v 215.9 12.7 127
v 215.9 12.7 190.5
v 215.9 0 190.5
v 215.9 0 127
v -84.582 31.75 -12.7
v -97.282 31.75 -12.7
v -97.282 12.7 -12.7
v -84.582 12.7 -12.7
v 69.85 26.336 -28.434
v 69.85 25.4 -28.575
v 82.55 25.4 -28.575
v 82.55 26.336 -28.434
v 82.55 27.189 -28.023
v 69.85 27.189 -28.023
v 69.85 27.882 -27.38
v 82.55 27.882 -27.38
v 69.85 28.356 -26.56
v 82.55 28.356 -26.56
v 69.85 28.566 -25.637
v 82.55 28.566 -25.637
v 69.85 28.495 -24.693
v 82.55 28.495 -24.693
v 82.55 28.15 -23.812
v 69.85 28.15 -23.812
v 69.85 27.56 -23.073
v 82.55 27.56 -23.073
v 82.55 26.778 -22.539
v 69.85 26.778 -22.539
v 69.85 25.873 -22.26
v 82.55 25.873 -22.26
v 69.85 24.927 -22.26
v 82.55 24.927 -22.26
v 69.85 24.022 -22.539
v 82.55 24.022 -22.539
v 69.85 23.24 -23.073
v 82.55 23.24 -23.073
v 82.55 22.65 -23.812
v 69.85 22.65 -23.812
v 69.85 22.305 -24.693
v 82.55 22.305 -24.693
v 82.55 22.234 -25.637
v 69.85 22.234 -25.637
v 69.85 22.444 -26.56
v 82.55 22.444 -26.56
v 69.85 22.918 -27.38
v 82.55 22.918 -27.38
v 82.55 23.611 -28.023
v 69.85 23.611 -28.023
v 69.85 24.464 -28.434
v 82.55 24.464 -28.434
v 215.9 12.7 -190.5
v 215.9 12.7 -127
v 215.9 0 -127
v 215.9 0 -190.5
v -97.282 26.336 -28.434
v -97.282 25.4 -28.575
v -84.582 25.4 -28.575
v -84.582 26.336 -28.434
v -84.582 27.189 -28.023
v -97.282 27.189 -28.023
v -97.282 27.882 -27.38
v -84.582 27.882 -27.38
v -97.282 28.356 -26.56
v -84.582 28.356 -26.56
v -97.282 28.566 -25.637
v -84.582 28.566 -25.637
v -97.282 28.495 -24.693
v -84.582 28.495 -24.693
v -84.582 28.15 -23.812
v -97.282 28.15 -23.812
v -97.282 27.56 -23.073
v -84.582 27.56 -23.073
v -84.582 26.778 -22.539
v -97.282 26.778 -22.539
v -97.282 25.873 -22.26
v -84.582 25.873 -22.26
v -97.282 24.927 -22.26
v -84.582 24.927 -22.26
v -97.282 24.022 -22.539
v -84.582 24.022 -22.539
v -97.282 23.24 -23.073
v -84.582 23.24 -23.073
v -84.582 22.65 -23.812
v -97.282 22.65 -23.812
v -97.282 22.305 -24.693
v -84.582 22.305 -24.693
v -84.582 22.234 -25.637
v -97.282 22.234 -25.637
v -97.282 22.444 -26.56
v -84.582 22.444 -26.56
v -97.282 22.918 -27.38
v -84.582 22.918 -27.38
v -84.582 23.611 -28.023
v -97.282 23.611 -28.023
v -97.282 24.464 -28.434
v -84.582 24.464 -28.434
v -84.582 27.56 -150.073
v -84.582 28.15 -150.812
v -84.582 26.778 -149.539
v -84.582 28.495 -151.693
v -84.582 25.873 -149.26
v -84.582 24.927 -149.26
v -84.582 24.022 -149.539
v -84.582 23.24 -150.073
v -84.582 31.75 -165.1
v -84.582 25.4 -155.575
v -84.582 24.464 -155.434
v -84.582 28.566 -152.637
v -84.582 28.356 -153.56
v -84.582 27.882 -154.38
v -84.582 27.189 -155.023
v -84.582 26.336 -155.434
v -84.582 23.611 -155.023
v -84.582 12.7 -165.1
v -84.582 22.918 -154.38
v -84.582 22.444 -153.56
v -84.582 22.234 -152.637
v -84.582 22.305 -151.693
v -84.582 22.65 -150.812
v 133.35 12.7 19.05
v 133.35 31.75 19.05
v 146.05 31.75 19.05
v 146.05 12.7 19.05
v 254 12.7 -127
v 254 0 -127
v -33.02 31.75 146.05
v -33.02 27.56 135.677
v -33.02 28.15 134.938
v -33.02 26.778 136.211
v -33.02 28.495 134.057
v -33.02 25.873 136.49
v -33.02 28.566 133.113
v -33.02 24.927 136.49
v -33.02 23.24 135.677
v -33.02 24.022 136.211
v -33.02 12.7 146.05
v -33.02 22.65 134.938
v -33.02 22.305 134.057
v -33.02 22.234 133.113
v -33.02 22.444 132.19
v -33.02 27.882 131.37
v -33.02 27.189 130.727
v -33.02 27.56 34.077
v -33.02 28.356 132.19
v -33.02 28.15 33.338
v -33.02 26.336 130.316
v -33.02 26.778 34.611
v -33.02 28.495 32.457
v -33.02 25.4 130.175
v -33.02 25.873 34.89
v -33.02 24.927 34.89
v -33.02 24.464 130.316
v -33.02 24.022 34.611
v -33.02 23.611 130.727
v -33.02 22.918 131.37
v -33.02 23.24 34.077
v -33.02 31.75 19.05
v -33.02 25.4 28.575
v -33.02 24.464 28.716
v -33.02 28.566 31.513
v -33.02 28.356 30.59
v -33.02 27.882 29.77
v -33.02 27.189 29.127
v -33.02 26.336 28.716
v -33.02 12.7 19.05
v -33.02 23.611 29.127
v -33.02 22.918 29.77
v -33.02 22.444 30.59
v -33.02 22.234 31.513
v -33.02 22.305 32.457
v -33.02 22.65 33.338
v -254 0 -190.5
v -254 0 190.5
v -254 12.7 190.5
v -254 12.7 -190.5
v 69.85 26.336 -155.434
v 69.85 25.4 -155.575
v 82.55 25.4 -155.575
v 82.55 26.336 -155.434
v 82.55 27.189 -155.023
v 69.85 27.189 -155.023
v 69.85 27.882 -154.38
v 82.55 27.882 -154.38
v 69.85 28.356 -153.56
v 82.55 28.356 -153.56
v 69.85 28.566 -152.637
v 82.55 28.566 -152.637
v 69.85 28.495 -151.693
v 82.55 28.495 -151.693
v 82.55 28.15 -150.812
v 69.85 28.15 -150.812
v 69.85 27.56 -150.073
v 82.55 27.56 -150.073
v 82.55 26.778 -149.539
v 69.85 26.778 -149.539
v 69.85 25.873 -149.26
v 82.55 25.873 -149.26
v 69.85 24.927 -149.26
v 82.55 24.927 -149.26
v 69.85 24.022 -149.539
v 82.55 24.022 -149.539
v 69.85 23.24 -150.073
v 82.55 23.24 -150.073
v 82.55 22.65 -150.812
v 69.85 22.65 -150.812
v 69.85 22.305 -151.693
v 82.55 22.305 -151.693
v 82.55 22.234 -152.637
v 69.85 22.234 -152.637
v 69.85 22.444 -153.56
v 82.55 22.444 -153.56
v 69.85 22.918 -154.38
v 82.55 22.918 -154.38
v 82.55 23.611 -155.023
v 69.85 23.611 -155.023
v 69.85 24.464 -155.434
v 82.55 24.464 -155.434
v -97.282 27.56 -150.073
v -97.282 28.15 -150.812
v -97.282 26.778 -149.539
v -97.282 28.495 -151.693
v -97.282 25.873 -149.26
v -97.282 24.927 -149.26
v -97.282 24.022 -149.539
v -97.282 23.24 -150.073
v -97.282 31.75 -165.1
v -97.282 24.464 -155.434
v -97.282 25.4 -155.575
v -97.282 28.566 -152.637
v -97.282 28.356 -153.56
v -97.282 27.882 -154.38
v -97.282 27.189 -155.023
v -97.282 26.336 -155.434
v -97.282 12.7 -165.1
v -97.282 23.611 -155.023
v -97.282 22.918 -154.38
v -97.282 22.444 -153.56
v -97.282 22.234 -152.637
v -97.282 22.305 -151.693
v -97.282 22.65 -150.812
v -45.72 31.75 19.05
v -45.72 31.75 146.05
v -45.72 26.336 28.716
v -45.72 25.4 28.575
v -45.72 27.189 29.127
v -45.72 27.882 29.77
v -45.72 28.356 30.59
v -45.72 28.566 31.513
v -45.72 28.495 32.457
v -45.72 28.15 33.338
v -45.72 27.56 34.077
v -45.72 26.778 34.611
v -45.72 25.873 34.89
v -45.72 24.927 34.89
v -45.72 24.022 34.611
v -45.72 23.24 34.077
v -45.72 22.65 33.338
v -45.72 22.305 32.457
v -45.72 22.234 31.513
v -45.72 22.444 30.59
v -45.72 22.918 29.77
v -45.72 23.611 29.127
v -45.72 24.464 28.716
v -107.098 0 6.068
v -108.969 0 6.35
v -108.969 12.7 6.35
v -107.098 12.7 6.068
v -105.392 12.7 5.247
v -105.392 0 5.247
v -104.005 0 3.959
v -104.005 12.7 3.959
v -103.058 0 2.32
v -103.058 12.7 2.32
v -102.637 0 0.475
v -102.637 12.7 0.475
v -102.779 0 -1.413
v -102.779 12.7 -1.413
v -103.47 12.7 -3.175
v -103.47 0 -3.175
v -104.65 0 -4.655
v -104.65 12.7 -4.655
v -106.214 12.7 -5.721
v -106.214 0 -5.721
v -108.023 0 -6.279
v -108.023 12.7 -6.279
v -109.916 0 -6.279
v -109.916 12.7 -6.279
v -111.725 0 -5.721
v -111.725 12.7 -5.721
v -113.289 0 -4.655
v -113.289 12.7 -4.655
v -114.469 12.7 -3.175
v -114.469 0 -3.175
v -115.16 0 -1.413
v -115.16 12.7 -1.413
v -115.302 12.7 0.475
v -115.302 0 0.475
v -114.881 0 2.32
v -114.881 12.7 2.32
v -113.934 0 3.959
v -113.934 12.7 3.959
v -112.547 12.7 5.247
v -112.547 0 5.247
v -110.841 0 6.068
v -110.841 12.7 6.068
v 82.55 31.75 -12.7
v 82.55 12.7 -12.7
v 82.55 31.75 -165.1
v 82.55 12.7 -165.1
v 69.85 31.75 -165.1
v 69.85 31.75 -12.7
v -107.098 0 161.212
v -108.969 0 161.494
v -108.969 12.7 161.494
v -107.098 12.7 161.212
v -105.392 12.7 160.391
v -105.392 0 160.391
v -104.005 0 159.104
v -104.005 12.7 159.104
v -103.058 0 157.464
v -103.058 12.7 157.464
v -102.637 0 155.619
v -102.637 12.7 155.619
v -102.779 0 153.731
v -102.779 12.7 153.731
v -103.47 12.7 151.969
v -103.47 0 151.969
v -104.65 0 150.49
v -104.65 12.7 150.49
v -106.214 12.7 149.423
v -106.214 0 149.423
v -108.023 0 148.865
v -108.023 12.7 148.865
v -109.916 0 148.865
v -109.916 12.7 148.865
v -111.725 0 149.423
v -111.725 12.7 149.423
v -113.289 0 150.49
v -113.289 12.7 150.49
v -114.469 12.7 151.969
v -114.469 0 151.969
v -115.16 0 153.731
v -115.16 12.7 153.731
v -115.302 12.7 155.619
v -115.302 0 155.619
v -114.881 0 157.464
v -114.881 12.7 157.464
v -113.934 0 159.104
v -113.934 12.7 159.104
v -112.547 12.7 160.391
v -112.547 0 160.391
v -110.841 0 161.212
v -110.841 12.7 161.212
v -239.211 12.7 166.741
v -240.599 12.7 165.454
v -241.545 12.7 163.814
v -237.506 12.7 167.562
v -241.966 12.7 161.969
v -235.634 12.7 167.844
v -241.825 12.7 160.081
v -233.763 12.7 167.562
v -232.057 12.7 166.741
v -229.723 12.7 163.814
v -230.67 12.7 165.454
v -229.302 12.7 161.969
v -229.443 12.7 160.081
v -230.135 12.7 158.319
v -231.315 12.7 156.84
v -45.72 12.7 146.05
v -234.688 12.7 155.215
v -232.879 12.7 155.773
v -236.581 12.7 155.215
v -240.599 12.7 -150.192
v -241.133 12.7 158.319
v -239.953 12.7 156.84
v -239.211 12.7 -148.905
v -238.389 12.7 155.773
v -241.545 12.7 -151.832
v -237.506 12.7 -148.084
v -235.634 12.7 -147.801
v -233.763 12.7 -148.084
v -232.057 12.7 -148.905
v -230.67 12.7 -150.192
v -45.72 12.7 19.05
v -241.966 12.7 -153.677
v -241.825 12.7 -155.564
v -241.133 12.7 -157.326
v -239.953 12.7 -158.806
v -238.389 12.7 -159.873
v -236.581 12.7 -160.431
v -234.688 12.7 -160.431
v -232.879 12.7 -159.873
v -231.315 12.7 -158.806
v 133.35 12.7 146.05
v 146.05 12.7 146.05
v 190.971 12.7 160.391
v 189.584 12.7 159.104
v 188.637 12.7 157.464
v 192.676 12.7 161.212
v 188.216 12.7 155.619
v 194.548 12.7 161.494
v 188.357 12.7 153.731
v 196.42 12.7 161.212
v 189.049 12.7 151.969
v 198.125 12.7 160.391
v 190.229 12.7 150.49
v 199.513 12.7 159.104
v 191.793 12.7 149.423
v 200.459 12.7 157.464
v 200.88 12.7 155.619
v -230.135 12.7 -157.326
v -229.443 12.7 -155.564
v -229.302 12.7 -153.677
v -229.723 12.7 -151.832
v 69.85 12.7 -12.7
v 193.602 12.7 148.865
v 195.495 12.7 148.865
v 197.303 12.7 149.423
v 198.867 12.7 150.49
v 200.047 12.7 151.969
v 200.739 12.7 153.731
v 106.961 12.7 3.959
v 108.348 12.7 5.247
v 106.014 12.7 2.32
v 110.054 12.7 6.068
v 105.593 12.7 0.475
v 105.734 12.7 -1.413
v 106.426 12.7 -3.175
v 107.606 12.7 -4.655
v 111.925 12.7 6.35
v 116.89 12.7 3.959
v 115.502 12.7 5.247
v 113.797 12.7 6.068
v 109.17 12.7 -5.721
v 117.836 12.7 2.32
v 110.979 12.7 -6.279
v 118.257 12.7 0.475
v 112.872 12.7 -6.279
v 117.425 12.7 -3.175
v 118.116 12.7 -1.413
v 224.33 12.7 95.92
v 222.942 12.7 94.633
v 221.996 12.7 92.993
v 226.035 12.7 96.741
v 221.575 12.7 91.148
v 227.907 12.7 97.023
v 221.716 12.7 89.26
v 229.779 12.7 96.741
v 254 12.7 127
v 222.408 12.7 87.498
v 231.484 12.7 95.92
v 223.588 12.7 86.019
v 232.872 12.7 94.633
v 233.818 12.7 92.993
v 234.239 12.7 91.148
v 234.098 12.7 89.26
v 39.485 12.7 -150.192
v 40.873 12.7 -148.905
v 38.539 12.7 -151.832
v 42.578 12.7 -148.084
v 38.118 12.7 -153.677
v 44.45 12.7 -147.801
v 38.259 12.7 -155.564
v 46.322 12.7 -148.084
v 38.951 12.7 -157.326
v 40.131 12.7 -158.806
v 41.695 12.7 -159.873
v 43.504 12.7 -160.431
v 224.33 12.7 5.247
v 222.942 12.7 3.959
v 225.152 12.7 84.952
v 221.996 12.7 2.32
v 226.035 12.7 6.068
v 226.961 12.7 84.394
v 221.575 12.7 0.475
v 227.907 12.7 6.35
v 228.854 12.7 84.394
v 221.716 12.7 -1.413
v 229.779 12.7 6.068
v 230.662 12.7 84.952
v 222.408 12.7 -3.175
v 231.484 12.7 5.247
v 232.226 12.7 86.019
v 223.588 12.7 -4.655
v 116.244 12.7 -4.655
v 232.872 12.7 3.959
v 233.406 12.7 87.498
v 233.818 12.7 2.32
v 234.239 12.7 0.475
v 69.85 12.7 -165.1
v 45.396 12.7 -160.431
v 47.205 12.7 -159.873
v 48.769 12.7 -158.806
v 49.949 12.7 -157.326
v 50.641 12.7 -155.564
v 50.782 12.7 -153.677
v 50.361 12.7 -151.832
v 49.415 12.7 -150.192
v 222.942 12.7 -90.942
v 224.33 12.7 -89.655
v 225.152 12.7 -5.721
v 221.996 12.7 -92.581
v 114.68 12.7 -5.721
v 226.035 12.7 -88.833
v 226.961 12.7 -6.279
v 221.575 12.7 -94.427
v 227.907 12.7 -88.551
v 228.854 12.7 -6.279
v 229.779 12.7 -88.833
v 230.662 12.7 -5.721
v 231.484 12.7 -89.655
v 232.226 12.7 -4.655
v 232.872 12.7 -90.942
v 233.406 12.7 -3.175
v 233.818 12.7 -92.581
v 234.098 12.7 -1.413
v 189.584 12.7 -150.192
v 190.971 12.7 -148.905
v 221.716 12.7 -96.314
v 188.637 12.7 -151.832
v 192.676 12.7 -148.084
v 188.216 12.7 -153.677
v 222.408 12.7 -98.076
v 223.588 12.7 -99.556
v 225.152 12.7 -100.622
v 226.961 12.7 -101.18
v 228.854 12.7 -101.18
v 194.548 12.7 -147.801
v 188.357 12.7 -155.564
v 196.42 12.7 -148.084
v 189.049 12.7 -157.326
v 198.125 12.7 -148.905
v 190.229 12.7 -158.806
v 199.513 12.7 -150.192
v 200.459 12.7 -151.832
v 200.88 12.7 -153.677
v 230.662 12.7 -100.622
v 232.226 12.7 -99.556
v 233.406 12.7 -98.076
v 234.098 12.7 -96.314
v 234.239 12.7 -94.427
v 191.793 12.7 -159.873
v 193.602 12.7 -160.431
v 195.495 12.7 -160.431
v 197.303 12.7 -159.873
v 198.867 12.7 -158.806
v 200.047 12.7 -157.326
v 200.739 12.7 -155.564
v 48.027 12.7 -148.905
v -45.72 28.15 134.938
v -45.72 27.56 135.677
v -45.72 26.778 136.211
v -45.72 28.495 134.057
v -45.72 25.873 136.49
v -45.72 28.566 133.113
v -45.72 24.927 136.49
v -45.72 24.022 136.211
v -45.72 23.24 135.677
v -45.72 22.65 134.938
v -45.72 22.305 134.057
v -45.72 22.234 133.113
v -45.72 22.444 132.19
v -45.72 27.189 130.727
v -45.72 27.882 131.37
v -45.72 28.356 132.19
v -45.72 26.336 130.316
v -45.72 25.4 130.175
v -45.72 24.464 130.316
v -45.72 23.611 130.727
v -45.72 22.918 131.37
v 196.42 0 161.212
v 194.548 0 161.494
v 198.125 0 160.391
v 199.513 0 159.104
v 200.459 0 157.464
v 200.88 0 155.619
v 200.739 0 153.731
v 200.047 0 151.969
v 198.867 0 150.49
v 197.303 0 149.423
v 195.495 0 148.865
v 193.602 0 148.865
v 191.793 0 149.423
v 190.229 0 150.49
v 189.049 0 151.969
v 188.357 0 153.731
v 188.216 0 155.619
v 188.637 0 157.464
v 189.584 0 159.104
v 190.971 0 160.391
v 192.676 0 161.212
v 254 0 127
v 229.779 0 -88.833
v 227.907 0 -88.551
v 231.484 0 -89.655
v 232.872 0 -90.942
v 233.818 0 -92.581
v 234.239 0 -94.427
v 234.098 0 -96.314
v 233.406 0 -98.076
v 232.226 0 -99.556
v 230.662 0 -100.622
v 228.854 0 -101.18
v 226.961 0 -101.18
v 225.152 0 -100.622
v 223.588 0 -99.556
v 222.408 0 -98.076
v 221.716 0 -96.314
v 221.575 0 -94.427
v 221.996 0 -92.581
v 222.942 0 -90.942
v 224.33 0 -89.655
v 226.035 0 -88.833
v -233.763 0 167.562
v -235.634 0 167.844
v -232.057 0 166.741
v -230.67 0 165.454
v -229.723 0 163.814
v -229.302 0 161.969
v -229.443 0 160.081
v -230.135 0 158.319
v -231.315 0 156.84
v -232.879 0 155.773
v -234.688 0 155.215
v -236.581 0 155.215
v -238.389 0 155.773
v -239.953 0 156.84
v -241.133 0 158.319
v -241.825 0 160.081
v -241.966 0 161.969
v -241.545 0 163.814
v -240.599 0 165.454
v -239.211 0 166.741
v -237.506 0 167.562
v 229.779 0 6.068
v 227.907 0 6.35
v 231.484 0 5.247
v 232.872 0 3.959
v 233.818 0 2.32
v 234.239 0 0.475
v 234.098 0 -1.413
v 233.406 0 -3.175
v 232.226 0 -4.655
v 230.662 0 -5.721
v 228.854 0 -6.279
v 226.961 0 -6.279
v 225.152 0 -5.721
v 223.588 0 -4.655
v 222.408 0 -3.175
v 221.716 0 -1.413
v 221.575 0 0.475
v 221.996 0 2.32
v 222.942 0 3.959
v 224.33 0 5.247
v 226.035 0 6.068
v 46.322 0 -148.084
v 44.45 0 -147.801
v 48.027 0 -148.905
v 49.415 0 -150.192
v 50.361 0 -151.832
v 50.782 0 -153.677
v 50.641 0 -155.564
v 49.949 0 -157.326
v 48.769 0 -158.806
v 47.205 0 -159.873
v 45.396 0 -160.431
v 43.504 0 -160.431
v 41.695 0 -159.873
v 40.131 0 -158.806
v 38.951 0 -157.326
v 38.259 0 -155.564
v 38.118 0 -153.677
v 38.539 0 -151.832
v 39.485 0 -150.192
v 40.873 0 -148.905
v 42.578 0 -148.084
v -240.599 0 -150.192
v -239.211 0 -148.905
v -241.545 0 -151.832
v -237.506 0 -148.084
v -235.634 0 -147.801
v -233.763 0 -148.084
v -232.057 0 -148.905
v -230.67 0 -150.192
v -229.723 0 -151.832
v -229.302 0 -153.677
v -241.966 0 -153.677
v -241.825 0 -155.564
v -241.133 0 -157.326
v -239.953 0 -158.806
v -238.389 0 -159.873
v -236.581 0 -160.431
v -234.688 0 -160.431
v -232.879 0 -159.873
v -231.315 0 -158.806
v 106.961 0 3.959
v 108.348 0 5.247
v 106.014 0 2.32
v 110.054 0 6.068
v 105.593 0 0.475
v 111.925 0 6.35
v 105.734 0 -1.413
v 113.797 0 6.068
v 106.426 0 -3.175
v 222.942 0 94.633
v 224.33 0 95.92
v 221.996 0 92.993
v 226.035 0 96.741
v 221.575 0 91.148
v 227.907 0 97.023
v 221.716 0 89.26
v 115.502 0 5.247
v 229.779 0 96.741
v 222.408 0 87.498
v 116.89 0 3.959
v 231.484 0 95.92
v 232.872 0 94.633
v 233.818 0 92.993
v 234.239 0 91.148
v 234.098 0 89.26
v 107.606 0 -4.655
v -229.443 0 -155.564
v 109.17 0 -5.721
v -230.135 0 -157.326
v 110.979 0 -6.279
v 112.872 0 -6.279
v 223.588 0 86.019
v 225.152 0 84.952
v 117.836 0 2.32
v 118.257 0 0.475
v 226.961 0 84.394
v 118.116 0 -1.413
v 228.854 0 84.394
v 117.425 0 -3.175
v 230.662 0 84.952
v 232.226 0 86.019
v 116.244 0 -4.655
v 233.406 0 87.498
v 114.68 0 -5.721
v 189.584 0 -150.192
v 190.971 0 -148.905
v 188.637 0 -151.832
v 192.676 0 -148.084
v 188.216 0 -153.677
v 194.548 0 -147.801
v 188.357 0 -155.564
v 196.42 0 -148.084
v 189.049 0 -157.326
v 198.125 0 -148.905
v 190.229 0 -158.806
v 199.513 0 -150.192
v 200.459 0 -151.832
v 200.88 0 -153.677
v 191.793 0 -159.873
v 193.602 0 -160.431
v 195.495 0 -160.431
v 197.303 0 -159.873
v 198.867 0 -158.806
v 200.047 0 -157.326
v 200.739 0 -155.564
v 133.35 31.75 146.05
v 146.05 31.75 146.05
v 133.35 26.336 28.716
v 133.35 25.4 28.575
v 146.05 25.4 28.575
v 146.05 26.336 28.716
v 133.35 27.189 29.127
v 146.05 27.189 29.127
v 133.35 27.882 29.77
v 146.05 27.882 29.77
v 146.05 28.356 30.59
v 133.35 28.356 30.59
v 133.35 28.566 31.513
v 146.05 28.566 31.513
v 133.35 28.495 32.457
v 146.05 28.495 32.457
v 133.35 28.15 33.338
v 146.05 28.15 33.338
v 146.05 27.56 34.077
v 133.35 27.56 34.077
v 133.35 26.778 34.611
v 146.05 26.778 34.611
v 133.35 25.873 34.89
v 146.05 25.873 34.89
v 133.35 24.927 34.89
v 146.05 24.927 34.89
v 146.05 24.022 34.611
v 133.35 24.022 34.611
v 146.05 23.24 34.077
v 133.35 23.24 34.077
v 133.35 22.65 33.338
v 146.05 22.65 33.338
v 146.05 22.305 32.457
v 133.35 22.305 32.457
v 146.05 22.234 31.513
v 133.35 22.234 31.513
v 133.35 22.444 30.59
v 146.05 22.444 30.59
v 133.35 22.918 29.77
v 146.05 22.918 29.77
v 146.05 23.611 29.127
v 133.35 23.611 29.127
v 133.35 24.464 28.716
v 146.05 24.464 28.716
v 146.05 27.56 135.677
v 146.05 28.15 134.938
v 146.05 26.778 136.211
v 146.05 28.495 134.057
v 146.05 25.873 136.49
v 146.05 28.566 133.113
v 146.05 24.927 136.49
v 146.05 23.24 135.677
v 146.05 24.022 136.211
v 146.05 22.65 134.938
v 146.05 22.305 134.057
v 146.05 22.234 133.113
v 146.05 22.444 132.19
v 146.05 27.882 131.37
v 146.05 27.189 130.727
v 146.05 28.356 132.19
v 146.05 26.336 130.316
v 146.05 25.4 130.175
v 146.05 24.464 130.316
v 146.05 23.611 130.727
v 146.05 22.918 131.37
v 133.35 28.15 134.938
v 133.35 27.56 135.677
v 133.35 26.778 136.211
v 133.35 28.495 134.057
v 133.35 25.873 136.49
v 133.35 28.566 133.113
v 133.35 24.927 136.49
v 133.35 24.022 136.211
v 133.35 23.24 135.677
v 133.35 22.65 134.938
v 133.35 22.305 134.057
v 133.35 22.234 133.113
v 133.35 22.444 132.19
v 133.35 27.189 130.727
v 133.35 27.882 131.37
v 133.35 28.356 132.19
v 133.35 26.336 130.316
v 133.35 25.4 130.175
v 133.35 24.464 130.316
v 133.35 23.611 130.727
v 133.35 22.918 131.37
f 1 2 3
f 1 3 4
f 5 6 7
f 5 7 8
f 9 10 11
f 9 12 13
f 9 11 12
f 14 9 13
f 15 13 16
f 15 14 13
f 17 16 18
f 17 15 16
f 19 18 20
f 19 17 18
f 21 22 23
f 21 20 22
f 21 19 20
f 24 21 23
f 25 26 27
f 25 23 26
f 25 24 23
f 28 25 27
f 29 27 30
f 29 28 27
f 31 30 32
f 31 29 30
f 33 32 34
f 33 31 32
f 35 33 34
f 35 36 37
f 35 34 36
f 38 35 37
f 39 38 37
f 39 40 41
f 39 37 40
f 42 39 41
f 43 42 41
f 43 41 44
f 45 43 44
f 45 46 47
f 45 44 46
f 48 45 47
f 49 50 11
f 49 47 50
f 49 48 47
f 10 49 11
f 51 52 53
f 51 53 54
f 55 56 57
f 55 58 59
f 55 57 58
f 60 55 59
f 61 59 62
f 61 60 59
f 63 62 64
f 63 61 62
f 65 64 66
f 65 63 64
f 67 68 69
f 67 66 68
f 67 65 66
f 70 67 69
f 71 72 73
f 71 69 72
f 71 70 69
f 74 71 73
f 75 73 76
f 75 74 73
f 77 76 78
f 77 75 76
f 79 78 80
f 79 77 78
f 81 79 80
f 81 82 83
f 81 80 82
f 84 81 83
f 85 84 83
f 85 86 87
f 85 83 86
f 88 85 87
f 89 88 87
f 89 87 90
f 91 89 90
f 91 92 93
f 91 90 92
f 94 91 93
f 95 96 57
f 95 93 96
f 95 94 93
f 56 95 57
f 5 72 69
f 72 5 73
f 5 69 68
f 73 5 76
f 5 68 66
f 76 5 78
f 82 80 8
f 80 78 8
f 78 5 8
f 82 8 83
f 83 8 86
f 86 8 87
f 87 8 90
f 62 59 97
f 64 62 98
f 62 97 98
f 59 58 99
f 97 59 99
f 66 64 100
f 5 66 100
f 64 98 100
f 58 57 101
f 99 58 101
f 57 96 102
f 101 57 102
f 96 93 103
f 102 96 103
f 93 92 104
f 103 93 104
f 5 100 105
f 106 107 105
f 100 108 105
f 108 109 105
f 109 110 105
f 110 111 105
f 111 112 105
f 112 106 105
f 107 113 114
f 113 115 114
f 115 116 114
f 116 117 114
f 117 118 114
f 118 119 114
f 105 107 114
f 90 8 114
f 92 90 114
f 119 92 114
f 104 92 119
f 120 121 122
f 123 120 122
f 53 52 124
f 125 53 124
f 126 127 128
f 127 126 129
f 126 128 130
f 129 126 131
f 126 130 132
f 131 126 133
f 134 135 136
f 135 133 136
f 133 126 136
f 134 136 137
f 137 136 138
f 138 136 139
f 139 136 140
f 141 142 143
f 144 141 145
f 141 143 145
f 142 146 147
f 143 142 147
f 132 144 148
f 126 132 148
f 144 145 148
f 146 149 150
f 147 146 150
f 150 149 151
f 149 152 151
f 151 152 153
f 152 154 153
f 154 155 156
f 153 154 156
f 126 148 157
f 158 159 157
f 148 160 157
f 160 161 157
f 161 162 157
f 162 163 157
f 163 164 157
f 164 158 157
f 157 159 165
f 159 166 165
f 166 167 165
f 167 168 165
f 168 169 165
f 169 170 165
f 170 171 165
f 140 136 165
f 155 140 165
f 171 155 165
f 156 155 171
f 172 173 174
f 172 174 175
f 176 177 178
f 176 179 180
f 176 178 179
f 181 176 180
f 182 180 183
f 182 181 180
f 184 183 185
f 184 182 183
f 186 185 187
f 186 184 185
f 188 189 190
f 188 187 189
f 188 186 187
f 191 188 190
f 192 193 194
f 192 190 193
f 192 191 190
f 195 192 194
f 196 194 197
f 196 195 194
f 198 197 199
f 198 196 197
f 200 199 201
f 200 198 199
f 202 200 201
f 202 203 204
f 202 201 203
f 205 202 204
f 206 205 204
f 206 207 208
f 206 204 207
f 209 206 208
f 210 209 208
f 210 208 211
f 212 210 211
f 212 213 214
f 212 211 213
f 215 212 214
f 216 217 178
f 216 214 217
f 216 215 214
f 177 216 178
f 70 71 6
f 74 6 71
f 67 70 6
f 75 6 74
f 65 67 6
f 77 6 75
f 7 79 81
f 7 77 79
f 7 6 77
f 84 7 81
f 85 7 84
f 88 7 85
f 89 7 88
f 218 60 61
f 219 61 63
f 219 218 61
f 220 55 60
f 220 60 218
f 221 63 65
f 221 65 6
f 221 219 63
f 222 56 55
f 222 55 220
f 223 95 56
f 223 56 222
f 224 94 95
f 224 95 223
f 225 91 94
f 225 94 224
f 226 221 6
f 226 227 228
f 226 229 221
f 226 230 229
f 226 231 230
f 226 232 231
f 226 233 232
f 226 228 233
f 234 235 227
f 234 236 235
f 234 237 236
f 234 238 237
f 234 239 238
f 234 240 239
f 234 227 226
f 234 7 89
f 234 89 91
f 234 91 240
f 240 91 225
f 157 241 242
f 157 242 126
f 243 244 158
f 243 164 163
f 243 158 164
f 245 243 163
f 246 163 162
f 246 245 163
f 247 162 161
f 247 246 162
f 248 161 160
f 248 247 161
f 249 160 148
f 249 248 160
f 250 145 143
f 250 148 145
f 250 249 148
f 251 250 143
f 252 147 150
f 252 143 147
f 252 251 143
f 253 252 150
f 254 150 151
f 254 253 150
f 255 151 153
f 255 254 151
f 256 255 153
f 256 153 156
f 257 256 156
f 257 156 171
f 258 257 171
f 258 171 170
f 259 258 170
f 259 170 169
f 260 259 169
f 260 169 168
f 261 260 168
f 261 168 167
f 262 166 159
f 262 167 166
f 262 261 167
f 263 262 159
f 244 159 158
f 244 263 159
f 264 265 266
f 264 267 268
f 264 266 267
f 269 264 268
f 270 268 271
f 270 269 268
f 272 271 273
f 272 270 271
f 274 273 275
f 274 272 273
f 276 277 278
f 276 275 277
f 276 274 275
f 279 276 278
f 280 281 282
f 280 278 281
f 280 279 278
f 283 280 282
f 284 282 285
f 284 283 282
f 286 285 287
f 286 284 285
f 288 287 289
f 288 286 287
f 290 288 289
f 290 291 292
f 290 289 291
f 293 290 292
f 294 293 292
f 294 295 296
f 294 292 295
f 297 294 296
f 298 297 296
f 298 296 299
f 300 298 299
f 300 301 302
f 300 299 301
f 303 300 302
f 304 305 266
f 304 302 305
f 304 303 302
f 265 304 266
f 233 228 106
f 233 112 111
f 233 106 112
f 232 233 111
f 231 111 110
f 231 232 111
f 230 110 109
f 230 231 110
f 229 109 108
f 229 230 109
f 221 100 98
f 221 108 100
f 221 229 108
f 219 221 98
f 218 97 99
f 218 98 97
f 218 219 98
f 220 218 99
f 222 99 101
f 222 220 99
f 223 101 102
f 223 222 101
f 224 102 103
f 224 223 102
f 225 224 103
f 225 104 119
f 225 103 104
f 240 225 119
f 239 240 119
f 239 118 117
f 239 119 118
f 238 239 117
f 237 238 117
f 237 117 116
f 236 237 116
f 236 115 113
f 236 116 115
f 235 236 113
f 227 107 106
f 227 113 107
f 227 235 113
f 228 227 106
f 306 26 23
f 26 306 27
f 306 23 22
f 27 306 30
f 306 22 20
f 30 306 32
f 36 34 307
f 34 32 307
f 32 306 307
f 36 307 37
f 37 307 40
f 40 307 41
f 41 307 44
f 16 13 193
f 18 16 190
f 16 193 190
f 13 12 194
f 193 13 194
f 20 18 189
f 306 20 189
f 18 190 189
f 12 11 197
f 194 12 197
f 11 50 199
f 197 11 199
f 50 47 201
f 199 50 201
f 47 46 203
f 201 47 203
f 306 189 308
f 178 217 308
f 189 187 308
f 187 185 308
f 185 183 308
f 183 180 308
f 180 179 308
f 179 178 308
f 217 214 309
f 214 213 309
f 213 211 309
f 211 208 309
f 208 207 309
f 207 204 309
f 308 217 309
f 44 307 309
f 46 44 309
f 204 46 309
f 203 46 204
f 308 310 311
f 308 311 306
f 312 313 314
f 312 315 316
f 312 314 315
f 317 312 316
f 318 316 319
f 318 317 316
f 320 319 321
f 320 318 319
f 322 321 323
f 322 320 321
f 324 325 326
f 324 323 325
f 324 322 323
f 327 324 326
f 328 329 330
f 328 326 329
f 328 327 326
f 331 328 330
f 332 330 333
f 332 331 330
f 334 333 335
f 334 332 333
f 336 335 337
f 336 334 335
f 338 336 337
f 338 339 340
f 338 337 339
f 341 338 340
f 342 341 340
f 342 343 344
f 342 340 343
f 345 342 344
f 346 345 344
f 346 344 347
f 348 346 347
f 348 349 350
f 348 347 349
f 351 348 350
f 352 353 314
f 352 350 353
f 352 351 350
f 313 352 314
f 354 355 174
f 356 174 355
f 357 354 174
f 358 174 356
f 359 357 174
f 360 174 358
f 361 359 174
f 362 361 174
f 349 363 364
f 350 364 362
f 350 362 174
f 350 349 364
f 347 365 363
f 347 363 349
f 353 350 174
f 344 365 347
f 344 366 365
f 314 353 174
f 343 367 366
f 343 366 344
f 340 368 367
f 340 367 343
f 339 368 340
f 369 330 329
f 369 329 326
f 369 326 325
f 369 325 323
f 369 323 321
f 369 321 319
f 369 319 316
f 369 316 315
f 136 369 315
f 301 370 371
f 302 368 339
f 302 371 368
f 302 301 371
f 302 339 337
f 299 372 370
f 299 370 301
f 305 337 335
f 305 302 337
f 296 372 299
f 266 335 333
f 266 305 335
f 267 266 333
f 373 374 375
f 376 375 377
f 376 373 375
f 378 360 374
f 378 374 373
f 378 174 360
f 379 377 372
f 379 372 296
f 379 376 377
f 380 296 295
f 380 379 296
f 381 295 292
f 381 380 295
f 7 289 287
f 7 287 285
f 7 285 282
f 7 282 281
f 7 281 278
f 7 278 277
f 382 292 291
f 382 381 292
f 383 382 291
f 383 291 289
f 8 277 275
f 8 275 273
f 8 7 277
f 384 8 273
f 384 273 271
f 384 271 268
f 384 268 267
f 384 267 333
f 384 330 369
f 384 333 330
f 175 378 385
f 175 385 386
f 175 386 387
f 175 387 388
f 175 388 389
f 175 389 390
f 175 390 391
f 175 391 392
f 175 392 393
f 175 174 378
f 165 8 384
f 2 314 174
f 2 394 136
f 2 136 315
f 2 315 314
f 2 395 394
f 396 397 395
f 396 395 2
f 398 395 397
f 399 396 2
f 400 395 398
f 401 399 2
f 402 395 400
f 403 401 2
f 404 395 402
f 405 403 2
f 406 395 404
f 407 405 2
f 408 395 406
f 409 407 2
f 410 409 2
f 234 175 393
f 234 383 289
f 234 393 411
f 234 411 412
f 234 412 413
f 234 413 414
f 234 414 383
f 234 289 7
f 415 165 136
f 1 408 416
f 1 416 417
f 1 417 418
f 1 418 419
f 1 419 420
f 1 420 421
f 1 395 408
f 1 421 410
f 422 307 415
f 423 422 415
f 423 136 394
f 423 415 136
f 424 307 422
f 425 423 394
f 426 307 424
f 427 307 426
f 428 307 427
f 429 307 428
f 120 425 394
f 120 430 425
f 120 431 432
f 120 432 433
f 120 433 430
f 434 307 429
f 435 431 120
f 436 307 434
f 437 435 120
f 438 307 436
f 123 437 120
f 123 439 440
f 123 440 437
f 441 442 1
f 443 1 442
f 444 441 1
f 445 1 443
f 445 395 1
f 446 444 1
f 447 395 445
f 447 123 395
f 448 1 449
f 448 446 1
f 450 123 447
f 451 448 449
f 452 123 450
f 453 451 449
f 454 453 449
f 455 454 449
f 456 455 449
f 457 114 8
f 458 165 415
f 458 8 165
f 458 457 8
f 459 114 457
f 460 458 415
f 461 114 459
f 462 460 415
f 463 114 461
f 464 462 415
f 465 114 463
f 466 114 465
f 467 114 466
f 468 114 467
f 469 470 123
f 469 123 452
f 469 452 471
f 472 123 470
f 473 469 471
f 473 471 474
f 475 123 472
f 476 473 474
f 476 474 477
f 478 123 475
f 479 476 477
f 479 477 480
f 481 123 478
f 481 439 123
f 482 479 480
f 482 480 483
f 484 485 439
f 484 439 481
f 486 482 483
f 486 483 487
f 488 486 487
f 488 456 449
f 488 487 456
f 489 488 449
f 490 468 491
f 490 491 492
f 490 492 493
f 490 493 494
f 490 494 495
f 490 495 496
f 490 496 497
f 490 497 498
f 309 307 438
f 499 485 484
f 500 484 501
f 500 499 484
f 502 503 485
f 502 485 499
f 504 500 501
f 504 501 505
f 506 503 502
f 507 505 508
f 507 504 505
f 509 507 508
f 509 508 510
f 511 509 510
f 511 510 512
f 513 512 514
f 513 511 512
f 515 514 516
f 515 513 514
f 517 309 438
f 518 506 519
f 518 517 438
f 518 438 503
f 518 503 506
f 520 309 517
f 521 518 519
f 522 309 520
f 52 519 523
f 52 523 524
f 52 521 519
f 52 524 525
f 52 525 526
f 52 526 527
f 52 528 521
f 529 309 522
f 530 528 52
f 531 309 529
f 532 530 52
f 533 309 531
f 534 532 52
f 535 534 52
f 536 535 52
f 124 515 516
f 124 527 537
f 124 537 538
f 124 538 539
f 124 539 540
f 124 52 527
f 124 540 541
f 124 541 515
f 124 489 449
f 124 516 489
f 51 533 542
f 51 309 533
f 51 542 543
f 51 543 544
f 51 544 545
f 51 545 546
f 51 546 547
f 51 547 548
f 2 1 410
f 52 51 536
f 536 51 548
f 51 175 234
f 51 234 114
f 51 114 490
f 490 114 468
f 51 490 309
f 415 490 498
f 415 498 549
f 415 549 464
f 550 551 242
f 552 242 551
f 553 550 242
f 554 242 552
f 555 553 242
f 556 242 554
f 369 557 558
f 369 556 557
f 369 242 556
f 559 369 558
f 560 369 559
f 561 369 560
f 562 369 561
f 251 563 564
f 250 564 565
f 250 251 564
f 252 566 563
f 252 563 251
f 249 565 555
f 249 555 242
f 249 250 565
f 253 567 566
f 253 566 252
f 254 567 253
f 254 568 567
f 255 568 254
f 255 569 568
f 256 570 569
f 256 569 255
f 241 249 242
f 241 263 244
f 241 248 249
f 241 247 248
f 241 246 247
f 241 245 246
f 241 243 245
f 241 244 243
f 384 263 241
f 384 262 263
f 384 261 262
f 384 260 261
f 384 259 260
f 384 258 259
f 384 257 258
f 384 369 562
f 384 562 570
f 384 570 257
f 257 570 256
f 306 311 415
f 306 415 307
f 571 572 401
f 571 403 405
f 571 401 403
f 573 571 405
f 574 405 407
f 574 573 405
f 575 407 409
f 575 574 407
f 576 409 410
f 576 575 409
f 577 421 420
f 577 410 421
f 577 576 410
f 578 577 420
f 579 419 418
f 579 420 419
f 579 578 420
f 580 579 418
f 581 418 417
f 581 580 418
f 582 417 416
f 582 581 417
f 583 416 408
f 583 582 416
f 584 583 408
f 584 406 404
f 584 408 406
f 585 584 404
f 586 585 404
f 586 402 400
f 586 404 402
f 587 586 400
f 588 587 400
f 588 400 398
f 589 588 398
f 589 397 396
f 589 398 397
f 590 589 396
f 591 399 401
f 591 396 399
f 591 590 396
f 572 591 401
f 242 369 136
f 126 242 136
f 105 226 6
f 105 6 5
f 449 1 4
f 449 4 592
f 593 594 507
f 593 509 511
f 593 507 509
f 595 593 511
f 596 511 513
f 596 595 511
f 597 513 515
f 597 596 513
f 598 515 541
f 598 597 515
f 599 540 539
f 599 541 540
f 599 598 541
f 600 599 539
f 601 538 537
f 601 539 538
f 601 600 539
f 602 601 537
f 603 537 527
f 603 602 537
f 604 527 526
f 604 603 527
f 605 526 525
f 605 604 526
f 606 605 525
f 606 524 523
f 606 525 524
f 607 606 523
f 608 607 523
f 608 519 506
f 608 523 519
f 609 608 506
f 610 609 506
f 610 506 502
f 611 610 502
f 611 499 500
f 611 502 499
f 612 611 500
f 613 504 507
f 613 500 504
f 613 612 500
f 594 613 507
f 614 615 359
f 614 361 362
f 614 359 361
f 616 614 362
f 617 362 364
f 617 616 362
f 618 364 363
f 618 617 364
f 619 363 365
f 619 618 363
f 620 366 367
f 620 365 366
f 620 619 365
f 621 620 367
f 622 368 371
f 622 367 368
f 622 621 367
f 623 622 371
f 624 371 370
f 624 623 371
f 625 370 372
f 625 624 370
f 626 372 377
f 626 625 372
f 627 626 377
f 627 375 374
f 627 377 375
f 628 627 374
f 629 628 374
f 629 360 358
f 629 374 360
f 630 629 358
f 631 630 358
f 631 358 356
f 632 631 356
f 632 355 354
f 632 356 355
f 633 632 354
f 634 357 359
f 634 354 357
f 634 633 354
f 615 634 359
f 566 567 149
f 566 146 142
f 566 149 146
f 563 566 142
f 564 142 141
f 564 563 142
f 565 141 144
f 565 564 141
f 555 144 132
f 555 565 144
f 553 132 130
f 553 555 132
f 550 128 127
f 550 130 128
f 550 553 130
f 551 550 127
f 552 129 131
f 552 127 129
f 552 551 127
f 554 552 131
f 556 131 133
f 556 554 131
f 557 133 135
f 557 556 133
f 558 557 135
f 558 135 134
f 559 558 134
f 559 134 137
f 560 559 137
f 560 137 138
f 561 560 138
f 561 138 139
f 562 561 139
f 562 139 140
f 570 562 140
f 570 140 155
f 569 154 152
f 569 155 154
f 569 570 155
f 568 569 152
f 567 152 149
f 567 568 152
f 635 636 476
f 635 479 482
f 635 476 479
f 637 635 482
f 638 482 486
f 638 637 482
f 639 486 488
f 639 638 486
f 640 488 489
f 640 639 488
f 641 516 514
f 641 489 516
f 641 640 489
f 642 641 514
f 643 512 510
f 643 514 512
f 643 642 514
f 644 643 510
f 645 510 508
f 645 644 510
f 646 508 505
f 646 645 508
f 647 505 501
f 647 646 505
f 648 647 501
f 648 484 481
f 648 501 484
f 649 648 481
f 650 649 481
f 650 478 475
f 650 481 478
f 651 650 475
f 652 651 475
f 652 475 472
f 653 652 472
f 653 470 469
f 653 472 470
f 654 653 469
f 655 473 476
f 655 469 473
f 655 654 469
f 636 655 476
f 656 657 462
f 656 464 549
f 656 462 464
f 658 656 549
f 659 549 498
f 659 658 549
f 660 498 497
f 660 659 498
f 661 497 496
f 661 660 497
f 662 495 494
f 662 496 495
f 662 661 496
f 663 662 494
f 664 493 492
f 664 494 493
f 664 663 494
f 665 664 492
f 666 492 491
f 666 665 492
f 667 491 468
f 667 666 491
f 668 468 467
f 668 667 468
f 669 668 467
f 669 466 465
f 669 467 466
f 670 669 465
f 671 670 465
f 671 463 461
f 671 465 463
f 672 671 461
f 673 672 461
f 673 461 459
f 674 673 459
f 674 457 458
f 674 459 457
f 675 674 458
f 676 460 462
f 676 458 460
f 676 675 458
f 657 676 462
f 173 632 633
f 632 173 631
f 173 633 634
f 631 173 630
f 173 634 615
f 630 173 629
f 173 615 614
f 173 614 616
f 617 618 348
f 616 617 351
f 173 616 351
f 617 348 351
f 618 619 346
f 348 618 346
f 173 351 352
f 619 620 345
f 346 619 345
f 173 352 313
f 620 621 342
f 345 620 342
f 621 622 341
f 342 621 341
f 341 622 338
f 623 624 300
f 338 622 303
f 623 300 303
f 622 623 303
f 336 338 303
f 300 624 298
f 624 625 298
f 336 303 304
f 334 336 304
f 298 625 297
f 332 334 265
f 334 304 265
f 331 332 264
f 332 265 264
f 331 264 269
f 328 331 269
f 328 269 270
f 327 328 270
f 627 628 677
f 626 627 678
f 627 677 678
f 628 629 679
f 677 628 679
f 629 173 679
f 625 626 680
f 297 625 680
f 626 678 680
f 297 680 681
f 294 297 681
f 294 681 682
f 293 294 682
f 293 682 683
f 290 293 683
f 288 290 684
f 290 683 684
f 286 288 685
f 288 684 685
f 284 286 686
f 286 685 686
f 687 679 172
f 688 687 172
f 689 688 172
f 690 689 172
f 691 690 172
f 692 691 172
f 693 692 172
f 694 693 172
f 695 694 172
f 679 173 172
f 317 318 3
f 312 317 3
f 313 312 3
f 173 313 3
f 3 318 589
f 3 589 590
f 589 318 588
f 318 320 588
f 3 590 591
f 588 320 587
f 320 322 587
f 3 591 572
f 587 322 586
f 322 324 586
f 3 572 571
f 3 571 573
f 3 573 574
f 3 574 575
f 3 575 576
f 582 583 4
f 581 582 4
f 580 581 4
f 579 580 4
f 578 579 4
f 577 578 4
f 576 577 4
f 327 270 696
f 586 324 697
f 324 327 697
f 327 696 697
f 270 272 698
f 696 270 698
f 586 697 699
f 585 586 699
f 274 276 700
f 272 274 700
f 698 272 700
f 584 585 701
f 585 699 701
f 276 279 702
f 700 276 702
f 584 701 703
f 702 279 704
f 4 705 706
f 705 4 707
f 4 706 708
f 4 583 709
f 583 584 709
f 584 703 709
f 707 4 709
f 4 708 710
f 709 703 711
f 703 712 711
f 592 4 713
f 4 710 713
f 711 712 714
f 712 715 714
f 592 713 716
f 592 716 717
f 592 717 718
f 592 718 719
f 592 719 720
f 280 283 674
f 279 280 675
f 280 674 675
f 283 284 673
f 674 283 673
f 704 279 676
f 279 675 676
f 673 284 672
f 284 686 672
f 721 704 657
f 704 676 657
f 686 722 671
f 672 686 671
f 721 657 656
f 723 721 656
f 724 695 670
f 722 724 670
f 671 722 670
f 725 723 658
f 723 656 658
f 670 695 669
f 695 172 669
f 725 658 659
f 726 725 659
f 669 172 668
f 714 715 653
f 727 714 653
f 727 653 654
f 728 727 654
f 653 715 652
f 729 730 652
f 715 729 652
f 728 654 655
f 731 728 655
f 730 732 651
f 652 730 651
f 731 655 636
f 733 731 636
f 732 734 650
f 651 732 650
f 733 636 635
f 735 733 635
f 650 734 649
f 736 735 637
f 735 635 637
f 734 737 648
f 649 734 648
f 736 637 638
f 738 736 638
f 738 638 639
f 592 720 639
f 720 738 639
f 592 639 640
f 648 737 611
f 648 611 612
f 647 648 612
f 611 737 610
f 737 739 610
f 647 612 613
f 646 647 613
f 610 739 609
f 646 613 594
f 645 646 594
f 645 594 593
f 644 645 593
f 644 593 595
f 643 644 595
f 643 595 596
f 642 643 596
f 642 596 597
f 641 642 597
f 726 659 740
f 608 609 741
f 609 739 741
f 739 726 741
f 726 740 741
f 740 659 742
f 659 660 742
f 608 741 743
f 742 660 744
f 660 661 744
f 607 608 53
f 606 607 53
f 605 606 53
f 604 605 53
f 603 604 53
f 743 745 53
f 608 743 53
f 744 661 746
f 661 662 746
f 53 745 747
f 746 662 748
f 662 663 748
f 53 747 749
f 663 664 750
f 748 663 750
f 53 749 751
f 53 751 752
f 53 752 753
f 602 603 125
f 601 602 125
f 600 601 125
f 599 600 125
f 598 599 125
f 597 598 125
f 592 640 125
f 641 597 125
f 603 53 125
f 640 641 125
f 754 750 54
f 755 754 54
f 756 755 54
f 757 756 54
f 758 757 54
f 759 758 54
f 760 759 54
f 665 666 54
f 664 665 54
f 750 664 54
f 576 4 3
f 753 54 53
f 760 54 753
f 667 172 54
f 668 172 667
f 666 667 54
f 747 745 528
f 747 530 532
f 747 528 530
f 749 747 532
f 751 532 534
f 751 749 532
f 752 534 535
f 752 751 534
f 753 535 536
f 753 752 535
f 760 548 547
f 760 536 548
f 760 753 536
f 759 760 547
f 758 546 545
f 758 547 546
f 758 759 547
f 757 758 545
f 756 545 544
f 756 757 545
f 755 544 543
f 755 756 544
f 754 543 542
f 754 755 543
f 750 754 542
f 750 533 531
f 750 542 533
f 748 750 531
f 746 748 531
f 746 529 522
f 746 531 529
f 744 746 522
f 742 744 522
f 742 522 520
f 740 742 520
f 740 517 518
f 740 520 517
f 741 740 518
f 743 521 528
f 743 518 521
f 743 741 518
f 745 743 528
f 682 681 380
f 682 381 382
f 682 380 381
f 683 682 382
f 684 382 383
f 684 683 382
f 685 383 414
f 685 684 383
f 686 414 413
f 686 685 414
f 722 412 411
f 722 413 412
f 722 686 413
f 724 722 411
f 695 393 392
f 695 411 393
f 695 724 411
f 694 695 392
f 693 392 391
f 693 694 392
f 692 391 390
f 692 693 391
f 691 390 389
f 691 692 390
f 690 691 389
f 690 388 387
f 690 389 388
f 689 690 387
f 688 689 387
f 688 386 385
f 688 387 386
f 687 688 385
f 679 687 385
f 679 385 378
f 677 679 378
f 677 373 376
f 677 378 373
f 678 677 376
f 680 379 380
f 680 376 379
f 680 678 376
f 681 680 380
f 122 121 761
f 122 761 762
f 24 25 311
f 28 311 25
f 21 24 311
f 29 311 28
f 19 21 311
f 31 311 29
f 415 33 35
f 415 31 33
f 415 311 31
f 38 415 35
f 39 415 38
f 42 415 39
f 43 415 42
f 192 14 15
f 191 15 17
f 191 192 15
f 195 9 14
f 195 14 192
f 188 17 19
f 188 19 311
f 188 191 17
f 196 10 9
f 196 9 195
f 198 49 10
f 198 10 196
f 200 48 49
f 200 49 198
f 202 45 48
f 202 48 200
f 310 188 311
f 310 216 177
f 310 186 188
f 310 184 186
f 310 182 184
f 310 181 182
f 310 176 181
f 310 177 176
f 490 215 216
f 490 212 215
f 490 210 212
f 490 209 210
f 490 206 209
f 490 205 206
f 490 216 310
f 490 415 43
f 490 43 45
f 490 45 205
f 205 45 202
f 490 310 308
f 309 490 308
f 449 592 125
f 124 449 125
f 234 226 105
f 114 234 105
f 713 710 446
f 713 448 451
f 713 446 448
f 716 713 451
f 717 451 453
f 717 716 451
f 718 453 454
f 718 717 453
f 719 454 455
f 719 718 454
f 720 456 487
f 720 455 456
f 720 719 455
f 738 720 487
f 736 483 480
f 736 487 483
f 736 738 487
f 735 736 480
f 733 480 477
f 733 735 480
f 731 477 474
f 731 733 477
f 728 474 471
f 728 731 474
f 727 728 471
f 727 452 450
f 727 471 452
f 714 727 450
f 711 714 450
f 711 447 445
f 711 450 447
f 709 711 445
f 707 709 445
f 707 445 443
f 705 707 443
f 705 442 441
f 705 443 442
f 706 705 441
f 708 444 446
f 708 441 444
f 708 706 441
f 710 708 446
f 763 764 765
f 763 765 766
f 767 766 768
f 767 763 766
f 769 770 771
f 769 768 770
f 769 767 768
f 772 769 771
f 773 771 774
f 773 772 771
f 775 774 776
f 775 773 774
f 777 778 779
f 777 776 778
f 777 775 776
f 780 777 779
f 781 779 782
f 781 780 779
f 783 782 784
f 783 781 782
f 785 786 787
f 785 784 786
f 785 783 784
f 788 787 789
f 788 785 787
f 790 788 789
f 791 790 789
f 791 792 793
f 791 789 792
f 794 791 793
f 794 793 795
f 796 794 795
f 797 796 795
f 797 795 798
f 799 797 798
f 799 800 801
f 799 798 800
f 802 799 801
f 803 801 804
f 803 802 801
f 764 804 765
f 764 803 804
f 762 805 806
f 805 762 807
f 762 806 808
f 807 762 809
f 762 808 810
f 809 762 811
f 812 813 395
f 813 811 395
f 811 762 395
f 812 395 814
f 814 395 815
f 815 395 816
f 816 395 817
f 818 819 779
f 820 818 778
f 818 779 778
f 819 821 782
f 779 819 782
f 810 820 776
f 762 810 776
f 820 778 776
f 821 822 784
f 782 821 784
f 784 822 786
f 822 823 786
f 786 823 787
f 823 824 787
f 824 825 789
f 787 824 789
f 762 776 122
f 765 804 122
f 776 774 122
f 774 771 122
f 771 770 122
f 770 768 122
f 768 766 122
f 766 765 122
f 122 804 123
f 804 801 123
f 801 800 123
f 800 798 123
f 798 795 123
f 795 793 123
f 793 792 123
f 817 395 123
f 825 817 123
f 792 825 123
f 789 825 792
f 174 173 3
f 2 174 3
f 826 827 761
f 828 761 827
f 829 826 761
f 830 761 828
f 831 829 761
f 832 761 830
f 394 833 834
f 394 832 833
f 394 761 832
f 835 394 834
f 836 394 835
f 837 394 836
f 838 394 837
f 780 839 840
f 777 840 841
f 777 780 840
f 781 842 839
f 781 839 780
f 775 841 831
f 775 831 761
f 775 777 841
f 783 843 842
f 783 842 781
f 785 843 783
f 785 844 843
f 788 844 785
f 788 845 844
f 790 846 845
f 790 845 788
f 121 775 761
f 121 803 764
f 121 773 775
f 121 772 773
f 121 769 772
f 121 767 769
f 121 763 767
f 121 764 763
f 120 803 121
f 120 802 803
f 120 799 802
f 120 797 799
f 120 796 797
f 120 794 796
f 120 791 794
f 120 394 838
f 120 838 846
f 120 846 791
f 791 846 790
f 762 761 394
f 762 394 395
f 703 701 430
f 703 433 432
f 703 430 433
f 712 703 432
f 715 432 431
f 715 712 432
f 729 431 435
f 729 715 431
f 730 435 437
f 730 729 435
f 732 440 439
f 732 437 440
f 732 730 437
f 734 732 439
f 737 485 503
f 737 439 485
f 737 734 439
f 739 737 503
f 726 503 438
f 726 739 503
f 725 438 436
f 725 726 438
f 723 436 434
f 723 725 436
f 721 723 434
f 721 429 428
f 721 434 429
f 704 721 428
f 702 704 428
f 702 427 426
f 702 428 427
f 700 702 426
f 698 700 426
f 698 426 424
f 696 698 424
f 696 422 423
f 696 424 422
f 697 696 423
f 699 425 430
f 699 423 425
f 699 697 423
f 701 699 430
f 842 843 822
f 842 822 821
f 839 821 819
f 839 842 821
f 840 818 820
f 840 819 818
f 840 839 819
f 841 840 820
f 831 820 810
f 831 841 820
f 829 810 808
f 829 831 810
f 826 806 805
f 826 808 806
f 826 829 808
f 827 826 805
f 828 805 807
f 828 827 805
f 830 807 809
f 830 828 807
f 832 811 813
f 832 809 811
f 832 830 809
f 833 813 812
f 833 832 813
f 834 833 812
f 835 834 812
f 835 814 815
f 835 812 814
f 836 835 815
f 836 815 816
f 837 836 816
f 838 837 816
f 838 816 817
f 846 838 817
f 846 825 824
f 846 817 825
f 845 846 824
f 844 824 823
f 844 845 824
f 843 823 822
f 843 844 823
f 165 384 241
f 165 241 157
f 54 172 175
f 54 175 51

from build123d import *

# Parameters (mm, degrees)
SKETCH1_W               = 508
SKETCH1_H               = 381
BOSS_EXTRUDE1_DEPTH     = 12.7
SKETCH5_W               = 12.7
SKETCH5_H               = 127
BOSS_EXTRUDE2_DEPTH     = 19.05
SKETCH6_W               = 12.7
SKETCH6_H               = 127
BOSS_EXTRUDE3_DEPTH     = 19.05
SKETCH7_W               = 12.7
SKETCH7_H               = 152.4
BOSS_EXTRUDE6_DEPTH     = 19.05
CUT_EXTRUDE1_DEPTH      = 445.227773783
CUT_EXTRUDE1_DEPTH_BACK = 445.227773783
SKETCH8_R               = 3.175
CUT_EXTRUDE2_DEPTH      = 389.026049383
CUT_EXTRUDE2_DEPTH_BACK = 389.026049383
SKETCH9_R               = 3.175
SKETCH10_W              = 38.1
SKETCH10_H              = 63.5
CUT_EXTRUDE3_DEPTH      = 319.070986574
SKETCH11_W              = 38.1
SKETCH11_H              = 63.5
CUT_EXTRUDE4_DEPTH      = 319.070986574
CUT_EXTRUDE5_DEPTH      = 319.070986574
CUT_EXTRUDE5_DEPTH_BACK = 319.070986574
SKETCH13_R              = 6.35


with BuildPart() as part:
    # Sketch1 → Boss-Extrude1 (new body)
    with BuildSketch(Plane(origin=(0, 0, 0), x_dir=(1, 0, 0), z_dir=(0, 1, 0))):
        Rectangle(SKETCH1_W, SKETCH1_H)
    extrude(amount=BOSS_EXTRUDE1_DEPTH)

    # Sketch5 → Boss-Extrude2 (add)
    with BuildSketch(Plane(origin=(0, 12.7, 0), x_dir=(1, 0, 0), z_dir=(0, 1, 0))):
        with Locations((139.7, -82.55)):
            Rectangle(SKETCH5_W, SKETCH5_H)
    extrude(amount=BOSS_EXTRUDE2_DEPTH)

    # Sketch6 → Boss-Extrude3 (add)
    with BuildSketch(Plane(origin=(0, 12.7, 0), x_dir=(1, 0, 0), z_dir=(0, 1, 0))):
        with Locations((-39.37, -82.55)):
            Rectangle(SKETCH6_W, SKETCH6_H)
    extrude(amount=BOSS_EXTRUDE3_DEPTH)

    # Sketch7 → Boss-Extrude6 (add)
    with BuildSketch(Plane(origin=(0, 12.7, 0), x_dir=(1, 0, 0), z_dir=(0, 1, 0))):
        with Locations((76.2, 88.9)):
            Rectangle(SKETCH7_W, SKETCH7_H)
        with Locations((-90.932, 88.9)):
            Rectangle(SKETCH7_W, SKETCH7_H)
    extrude(amount=BOSS_EXTRUDE6_DEPTH)

    # Sketch8 → Cut-Extrude1 (cut, two sides: drawn at the far end of the back side and taken through both)
    with BuildSketch(Plane(origin=(146.05, 0, 0), x_dir=(0, 0, -1), z_dir=(1, 0, 0)).offset(-CUT_EXTRUDE1_DEPTH_BACK)):
        with Locations((-31.75, 25.4)):
            Circle(SKETCH8_R)
        with Locations((-133.35, 25.4)):
            Circle(SKETCH8_R)
    extrude(amount=CUT_EXTRUDE1_DEPTH + CUT_EXTRUDE1_DEPTH_BACK, mode=Mode.SUBTRACT)

    # Sketch9 → Cut-Extrude2 (cut, two sides: drawn at the far end of the back side and taken through both)
    with BuildSketch(Plane(origin=(82.55, 0, 0), x_dir=(0, 0, -1), z_dir=(1, 0, 0)).offset(-CUT_EXTRUDE2_DEPTH_BACK)):
        with Locations((25.4, 25.4)):
            Circle(SKETCH9_R)
        with Locations((152.4, 25.4)):
            Circle(SKETCH9_R)
    extrude(amount=CUT_EXTRUDE2_DEPTH + CUT_EXTRUDE2_DEPTH_BACK, mode=Mode.SUBTRACT)

    # Sketch10 → Cut-Extrude3 (cut, through all)
    with BuildSketch(Plane(origin=(0, 12.7, 0), x_dir=(1, 0, 0), z_dir=(0, 1, 0))):
        with Locations((234.95, -158.75)):
            Rectangle(SKETCH10_W, SKETCH10_H)
    extrude(amount=-CUT_EXTRUDE3_DEPTH, mode=Mode.SUBTRACT)

    # Sketch11 → Cut-Extrude4 (cut, through all)
    with BuildSketch(Plane(origin=(0, 12.7, 0), x_dir=(1, 0, 0), z_dir=(0, 1, 0))):
        with Locations((234.95, 158.75)):
            Rectangle(SKETCH11_W, SKETCH11_H)
    extrude(amount=-CUT_EXTRUDE4_DEPTH, mode=Mode.SUBTRACT)

    # Sketch13 → Cut-Extrude5 (cut, two sides: drawn at the far end of the back side and taken through both)
    with BuildSketch(Plane(origin=(0, 12.7, 0), x_dir=(1, 0, 0), z_dir=(0, 1, 0)).offset(-CUT_EXTRUDE5_DEPTH_BACK)):
        with Locations(Location((227.907081751, 0, 0), (0, 0, 270))):
            Circle(SKETCH13_R)
        with Locations(Location((111.925251719, 0, 0), (0, 0, 270))):
            Circle(SKETCH13_R)
        with Locations(Location((-108.969473195, 0, 0), (0, 0, 270))):
            Circle(SKETCH13_R)
        with Locations(Location((227.907081751, -90.673413336, 0), (0, 0, 270))):
            Circle(SKETCH13_R)
        with Locations(Location((227.907081751, 94.901161445, 0), (0, 0, 270))):
            Circle(SKETCH13_R)
        with Locations(Location((194.548146226, 154.151481102, 0), (0, 0, 270))):
            Circle(SKETCH13_R)
        with Locations(Location((194.548146226, -155.144429721, 0), (0, 0, 270))):
            Circle(SKETCH13_R)
        with Locations(Location((-235.634199607, -161.494429721, 0), (0, 0, 270))):
            Circle(SKETCH13_R)
        with Locations(Location((-235.634199607, 154.151481102, 0), (0, 0, 270))):
            Circle(SKETCH13_R)
        with Locations(Location((44.45, 154.151481102, 0), (0, 0, 270))):
            Circle(SKETCH13_R)
        with Locations(Location((-108.969473196, -155.144429721, 0), (0, 0, 270))):
            Circle(SKETCH13_R)
    extrude(amount=CUT_EXTRUDE5_DEPTH + CUT_EXTRUDE5_DEPTH_BACK, mode=Mode.SUBTRACT)


solid = part.part
